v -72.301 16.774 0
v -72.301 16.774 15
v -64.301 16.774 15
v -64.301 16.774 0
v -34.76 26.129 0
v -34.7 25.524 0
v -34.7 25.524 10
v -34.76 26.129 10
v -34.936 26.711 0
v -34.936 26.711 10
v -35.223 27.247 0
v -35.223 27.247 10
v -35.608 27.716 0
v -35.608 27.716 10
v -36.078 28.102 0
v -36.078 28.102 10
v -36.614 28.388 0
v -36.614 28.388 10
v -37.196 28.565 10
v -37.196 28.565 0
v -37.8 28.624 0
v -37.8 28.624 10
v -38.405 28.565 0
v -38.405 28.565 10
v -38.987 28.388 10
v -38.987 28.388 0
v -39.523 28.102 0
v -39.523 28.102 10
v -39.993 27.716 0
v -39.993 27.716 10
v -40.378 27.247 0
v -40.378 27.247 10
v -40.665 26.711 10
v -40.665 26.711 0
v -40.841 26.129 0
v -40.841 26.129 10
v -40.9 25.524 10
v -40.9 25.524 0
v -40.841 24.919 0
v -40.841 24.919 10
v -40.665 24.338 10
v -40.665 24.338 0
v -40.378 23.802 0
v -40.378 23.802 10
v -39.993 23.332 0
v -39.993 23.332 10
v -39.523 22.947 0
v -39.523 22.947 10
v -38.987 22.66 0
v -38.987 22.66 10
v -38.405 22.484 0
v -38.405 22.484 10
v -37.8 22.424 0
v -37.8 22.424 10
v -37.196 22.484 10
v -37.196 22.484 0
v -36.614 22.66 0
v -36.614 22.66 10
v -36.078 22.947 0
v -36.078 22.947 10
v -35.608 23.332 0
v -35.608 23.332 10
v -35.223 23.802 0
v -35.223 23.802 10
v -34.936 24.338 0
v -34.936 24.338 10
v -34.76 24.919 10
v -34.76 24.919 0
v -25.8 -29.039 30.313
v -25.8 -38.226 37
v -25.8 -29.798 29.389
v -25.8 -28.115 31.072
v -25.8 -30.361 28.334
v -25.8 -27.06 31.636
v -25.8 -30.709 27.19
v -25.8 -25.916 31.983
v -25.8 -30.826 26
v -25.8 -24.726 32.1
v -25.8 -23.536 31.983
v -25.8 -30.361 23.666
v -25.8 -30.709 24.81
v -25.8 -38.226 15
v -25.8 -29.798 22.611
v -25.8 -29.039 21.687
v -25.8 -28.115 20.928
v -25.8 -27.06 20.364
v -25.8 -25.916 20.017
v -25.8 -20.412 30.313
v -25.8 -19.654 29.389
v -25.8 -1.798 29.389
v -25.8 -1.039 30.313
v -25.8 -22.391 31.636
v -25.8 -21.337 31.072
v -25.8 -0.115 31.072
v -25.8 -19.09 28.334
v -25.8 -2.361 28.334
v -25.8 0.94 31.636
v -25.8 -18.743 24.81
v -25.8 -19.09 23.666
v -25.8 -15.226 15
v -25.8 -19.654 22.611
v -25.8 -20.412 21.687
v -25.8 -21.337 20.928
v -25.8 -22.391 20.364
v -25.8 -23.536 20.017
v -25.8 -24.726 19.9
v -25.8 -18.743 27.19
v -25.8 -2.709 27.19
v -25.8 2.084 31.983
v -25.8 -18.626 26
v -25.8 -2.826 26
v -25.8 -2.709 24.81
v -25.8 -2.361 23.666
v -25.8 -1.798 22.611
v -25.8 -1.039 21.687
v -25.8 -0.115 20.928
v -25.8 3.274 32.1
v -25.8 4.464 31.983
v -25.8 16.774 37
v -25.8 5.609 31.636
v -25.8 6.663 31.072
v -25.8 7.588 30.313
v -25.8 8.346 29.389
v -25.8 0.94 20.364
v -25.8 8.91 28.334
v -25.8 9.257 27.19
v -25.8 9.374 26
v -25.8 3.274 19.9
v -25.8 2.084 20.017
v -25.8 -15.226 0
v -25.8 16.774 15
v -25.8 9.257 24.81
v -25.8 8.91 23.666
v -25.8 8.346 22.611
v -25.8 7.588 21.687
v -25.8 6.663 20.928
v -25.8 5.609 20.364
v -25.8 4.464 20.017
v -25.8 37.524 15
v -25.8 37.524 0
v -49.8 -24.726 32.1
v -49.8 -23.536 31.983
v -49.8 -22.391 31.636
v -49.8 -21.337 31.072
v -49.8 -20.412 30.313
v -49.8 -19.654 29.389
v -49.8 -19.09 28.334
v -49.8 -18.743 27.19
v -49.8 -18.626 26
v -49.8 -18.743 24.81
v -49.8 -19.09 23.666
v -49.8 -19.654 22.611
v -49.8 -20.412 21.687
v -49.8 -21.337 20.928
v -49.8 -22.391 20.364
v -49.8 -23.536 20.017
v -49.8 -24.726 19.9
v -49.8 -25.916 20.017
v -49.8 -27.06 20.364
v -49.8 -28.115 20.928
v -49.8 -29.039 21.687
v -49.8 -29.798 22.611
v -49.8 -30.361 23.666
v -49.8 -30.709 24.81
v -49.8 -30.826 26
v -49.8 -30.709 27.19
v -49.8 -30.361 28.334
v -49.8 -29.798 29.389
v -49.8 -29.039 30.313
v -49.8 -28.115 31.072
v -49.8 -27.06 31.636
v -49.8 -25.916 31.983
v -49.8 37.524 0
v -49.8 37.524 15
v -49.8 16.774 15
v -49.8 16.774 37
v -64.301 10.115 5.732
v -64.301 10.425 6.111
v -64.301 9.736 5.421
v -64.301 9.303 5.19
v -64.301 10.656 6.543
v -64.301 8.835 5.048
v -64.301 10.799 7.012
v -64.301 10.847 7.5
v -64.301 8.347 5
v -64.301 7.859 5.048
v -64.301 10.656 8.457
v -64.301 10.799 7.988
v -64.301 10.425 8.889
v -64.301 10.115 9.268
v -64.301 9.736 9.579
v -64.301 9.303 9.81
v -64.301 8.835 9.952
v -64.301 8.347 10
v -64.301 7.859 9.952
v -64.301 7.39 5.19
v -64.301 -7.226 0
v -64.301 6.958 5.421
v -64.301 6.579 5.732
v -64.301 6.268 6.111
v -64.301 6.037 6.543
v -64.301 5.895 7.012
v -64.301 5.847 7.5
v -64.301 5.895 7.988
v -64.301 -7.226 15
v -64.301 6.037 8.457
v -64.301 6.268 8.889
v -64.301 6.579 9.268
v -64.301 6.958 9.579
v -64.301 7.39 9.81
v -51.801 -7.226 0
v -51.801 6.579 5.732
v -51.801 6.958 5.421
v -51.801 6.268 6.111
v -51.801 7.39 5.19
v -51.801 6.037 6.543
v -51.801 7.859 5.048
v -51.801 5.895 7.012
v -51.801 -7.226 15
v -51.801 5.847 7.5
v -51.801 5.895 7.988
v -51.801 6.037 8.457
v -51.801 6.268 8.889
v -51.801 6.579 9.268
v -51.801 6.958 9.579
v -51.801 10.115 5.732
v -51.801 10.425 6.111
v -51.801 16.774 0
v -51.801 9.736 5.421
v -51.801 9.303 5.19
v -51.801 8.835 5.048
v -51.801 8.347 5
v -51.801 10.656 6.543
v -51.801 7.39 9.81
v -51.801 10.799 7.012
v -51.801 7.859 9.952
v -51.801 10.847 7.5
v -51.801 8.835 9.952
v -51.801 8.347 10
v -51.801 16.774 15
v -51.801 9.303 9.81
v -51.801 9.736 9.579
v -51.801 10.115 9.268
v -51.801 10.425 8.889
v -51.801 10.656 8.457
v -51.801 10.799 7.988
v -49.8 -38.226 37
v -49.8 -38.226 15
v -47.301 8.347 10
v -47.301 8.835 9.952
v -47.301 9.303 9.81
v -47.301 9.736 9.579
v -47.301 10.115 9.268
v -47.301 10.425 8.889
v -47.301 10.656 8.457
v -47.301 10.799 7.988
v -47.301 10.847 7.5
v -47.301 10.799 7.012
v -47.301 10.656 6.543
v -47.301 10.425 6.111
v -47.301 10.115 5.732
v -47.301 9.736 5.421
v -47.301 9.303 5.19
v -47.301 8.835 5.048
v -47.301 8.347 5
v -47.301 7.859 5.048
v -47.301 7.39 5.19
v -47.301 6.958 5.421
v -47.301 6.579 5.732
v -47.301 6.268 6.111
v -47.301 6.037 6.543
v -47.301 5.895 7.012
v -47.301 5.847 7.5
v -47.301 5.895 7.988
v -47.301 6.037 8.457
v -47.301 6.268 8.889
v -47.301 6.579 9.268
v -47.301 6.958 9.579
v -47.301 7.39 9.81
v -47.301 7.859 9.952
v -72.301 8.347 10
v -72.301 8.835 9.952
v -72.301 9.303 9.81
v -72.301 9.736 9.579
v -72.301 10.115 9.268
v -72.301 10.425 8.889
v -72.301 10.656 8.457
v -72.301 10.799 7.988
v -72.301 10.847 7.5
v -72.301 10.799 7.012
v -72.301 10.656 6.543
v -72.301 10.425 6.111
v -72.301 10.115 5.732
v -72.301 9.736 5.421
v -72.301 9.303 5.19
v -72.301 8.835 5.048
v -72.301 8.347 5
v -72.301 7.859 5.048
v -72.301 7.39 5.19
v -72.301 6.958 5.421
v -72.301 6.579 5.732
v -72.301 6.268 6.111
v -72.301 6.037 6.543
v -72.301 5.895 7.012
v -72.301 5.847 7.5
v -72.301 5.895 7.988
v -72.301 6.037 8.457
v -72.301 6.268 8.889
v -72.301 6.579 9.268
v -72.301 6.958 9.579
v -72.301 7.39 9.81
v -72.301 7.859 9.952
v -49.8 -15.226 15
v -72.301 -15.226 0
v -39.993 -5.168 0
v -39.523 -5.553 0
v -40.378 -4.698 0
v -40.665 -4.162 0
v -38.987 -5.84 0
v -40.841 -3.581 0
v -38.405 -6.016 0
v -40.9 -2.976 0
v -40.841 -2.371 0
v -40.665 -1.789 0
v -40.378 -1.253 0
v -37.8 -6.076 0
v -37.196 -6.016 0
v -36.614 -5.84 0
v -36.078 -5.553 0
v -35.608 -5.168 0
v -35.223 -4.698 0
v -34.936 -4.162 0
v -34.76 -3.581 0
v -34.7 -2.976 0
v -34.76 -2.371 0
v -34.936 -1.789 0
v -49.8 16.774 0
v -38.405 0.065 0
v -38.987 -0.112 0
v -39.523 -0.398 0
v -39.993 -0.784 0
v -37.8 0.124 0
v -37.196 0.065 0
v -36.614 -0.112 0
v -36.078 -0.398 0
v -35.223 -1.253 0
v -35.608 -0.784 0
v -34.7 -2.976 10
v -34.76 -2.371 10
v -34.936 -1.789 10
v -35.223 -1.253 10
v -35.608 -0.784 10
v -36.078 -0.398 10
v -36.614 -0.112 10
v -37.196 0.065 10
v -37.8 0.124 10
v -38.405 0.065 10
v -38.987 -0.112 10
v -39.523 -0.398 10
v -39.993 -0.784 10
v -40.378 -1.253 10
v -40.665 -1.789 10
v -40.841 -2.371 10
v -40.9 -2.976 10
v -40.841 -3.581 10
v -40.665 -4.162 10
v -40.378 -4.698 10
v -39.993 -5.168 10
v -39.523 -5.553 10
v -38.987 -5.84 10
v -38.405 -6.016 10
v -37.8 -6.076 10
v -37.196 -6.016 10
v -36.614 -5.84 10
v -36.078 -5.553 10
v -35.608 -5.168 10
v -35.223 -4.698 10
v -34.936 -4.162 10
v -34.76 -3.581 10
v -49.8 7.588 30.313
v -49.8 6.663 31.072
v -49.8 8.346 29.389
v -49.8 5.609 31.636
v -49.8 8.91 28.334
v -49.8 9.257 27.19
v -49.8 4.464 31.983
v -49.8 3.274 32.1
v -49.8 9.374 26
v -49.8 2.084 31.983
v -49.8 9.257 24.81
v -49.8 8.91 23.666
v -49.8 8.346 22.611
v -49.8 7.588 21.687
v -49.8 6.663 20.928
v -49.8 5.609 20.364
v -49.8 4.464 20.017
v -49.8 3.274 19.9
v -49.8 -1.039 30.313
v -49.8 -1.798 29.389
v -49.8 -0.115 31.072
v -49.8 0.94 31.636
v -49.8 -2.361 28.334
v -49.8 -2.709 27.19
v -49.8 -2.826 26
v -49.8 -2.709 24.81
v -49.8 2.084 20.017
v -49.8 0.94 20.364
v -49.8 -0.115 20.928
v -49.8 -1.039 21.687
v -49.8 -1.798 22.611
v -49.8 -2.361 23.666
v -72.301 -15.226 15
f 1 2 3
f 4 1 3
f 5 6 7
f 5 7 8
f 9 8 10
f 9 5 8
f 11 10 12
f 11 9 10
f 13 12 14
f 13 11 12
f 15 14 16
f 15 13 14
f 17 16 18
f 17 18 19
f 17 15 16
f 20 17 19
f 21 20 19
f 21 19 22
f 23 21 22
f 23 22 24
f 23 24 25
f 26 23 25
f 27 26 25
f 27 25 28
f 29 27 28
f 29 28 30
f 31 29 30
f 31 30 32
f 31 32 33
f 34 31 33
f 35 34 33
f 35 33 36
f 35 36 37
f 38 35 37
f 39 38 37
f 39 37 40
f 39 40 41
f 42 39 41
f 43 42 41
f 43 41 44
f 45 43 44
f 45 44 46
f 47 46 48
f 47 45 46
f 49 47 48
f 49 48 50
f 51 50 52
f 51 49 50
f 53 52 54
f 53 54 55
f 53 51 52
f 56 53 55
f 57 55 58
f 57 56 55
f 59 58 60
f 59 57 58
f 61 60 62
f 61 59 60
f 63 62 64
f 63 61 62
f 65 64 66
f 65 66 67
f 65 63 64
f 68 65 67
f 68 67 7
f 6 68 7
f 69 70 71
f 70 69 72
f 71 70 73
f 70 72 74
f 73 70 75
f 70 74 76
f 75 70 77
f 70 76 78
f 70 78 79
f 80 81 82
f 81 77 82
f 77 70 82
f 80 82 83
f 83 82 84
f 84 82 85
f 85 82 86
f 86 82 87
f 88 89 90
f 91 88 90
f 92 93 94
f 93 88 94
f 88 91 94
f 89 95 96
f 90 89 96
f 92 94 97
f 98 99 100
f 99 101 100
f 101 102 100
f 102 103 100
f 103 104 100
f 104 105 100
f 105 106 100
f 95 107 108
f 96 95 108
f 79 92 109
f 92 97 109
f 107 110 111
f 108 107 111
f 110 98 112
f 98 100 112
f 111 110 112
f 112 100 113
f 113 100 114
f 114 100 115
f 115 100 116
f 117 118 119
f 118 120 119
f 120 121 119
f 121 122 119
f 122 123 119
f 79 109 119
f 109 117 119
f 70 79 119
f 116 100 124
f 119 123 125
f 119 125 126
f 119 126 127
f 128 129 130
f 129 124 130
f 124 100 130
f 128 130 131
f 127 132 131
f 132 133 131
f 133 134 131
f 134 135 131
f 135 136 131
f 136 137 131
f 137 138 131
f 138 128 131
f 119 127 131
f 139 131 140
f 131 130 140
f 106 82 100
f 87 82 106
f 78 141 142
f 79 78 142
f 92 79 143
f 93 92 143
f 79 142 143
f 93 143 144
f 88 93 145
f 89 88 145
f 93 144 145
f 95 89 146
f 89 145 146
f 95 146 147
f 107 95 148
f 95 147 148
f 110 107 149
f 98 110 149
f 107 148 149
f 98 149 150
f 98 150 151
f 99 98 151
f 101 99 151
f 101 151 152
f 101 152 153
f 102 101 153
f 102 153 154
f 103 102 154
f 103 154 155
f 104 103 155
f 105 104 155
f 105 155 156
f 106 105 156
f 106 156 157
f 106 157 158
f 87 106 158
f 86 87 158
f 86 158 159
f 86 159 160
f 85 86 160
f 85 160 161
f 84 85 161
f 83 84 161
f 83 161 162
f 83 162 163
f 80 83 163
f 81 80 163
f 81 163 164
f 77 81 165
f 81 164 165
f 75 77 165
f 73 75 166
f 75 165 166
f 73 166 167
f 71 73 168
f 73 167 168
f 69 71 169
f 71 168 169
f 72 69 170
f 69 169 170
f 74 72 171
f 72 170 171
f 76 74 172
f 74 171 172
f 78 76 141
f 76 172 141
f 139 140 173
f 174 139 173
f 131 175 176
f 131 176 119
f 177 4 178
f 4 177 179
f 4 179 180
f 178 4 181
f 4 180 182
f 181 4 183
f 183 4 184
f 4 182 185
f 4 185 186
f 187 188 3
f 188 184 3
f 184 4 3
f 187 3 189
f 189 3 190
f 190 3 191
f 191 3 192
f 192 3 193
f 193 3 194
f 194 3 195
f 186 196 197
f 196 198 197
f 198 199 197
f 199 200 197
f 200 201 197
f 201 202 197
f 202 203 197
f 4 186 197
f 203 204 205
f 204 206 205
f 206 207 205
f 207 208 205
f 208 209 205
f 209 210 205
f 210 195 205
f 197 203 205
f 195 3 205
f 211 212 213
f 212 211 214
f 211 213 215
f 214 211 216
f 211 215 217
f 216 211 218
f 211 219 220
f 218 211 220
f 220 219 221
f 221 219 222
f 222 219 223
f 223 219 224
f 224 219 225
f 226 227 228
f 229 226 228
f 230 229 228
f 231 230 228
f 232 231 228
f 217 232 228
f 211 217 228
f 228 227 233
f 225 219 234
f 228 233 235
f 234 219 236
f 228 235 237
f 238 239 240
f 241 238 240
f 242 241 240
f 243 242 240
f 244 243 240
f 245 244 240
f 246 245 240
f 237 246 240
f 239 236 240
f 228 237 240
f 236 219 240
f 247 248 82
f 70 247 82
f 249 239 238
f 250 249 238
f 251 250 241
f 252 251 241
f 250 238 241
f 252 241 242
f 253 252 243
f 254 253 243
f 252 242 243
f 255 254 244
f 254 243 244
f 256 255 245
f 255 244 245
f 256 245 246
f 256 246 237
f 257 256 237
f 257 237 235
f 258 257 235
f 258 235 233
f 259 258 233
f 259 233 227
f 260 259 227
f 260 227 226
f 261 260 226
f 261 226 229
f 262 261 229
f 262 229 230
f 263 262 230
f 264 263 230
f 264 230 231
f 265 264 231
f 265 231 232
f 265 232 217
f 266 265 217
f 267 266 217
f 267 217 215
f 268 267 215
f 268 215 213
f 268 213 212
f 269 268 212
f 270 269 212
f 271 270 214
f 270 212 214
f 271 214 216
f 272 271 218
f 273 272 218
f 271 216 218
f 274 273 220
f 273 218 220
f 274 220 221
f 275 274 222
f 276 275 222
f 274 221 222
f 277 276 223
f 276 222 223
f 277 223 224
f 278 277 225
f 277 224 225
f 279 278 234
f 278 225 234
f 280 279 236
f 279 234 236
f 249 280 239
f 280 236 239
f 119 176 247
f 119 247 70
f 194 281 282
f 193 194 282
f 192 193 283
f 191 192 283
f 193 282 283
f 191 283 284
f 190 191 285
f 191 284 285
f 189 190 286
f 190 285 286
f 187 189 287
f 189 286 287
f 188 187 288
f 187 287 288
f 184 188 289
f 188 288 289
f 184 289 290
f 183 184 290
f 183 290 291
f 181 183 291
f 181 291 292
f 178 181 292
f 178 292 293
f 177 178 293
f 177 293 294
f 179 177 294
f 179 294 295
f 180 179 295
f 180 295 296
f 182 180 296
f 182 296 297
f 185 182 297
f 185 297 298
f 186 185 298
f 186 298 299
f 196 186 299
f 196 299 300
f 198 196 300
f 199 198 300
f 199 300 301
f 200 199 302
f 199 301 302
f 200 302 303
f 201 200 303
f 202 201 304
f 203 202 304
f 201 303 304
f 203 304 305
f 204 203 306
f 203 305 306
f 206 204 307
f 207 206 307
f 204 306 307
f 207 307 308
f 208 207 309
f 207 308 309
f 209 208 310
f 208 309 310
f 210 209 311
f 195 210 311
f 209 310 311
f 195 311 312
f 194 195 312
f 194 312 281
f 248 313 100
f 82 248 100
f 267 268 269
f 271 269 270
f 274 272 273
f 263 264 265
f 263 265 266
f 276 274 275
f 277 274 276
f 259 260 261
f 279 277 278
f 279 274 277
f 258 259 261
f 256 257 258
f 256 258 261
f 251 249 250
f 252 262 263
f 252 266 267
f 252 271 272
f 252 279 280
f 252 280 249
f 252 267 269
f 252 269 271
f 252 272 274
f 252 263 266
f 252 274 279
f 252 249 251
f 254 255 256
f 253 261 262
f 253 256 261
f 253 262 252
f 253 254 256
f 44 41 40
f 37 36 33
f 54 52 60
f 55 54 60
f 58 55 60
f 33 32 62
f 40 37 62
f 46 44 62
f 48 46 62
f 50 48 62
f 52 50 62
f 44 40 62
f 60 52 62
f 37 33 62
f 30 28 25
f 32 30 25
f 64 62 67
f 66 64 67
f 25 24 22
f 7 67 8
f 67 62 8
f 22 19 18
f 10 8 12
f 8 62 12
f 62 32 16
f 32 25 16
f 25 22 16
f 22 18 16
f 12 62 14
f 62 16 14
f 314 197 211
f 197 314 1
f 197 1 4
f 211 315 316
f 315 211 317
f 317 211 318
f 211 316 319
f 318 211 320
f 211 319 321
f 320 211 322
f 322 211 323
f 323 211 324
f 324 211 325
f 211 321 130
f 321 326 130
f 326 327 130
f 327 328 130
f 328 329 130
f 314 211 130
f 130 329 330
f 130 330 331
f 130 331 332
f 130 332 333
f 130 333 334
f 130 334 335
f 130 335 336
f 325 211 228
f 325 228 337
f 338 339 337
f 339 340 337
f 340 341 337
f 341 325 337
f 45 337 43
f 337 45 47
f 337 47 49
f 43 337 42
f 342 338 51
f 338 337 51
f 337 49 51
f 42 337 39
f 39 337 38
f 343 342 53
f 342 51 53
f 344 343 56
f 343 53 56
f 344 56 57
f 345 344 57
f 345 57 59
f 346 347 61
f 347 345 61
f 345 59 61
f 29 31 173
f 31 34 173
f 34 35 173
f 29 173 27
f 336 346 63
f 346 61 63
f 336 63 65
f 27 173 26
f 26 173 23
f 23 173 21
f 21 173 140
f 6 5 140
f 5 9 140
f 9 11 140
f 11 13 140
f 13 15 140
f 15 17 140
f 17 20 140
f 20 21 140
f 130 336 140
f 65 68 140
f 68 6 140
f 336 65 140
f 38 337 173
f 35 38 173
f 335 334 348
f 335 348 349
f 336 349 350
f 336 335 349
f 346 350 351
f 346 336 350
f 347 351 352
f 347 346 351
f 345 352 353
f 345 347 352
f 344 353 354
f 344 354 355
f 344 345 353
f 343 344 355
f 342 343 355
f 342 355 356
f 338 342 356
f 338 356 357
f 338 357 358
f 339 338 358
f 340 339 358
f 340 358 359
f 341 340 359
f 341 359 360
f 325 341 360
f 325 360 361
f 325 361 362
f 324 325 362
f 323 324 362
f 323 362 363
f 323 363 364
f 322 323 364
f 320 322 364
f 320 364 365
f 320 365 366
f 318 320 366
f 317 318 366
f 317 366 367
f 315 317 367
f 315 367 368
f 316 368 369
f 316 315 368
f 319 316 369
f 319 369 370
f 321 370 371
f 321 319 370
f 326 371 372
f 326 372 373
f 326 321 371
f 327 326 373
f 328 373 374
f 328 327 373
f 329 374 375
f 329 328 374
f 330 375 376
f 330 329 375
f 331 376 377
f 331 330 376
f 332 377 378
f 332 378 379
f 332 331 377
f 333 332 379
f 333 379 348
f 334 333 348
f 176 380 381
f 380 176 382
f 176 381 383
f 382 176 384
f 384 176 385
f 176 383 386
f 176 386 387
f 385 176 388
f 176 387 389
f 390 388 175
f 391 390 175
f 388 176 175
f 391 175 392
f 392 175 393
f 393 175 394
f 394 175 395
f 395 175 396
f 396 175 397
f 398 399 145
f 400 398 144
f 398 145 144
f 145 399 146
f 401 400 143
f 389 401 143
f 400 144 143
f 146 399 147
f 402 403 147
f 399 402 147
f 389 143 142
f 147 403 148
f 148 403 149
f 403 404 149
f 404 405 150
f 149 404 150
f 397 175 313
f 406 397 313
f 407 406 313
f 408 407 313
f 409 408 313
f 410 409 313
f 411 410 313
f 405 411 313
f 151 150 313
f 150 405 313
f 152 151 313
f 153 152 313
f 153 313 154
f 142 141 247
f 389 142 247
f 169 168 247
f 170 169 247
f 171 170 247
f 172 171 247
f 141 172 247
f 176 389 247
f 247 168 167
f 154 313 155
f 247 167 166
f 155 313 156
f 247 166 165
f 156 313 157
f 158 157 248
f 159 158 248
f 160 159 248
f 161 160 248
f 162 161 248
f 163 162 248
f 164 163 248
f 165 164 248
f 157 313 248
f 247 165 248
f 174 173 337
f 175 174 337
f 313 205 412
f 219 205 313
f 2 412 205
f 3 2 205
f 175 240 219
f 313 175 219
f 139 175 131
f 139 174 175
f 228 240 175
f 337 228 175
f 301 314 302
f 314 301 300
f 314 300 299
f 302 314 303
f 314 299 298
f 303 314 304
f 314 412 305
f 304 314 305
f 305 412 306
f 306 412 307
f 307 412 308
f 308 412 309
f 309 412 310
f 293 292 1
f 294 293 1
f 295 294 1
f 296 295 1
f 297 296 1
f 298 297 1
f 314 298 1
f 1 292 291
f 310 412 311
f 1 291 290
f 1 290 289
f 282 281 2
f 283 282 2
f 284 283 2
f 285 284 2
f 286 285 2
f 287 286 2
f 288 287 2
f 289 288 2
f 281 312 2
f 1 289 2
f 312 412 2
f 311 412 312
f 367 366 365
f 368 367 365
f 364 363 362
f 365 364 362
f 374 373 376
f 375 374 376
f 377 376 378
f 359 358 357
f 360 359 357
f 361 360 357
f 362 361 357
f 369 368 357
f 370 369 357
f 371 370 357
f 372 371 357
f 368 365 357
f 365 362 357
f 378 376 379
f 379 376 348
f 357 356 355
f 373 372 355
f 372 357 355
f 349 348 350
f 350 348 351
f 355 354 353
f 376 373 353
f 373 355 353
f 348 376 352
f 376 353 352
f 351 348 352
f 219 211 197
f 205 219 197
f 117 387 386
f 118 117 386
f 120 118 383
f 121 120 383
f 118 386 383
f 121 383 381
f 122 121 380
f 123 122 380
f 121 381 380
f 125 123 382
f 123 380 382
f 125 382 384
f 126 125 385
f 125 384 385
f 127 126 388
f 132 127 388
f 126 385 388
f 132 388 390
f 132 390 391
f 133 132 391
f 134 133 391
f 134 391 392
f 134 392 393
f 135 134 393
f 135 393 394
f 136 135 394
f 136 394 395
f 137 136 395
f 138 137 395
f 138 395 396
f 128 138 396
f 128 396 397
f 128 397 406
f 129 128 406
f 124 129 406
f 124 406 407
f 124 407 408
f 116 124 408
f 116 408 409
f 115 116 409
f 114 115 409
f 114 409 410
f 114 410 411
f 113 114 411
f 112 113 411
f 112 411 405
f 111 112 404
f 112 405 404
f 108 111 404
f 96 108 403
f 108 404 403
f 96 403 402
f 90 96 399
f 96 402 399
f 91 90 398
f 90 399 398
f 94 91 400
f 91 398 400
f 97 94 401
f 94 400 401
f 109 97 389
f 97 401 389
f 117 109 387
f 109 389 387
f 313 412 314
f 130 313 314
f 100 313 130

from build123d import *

# Parameters (mm, degrees)
SKETCH1_R           = 3.1
SKETCH1_R_2         = 2.5
BOSS_EXTRUDE1_DEPTH = 15
SKETCH6_R           = 3.1
BOSS_EXTRUDE3_DEPTH = 5
BOSS_EXTRUDE4_DEPTH = 15
SKETCH8_R           = 2.5
CUT_EXTRUDE3_DEPTH  = 25
CUT_EXTRUDE4_DEPTH  = 16
SKETCH11_W          = 24
SKETCH11_H          = 0.25
BOSS_EXTRUDE5_DEPTH = 15
SKETCH12_W          = 24
SKETCH12_H          = 32
SKETCH12_H_2        = 23
BOSS_EXTRUDE6_DEPTH = 22
SKETCH13_R          = 6.1
CUT_EXTRUDE5_DEPTH  = 25


with BuildPart() as part:
    # Sketch1 → Boss-Extrude1 (new body)
    with BuildSketch(Plane.XY):
        with BuildLine():
            Line((-25.80048806, 37.524276553), (-49.80048806, 37.524276553))
            Line((-49.80048806, 37.524276553), (-49.80048806, -14.975723447))
            Line((-49.80048806, -14.975723447), (-41.80048806, -45.286414829))
            ThreePointArc((-41.80048806, -45.286414829), (-37.80048806, -49.286414829), (-33.80048806, -45.286414829))
            Line((-33.80048806, -45.286414829), (-25.80048806, -14.975723447))
            Line((-25.80048806, -14.975723447), (-25.80048806, 37.524276553))
        make_face()
        with Locations((-37.80048806, 25.524276553)):
            Circle(SKETCH1_R, mode=Mode.SUBTRACT)
        with Locations((-37.80048806, -2.975723447)):
            Circle(SKETCH1_R, mode=Mode.SUBTRACT)
        with Locations((-37.80048806, -45.286414829)):
            Circle(SKETCH1_R_2, mode=Mode.SUBTRACT)
    extrude(amount=BOSS_EXTRUDE1_DEPTH)

    # Sketch6 → Boss-Extrude3 (add)
    with BuildSketch(Plane.XY.offset(15)):
        with Locations((-37.80048806, -2.975723447)):
            Circle(SKETCH6_R)
        with Locations((-37.80048806, 25.524276553)):
            Circle(SKETCH6_R)
    extrude(amount=-BOSS_EXTRUDE3_DEPTH)

    # Sketch7 → Boss-Extrude4 (add)
    with BuildSketch(Plane.XY.offset(15)):
        Polygon((-51.800511672, 16.774276553), (-49.80048806, 16.774276553), (-49.80048806, -15.225723447), (-72.300511672, -15.225723447), (-72.300511672, 16.774276553), (-64.300511672, 16.774276553), (-64.300511672, -7.225723447), (-58.050499866, -7.225723447), (-51.800511672, -7.225723447), align=None)
    extrude(amount=-BOSS_EXTRUDE4_DEPTH)

    # Sketch8 → Cut-Extrude3 (cut)
    with BuildSketch(Plane.ZY.offset(72.300511672)):
        with Locations((7.5, 8.346782821)):
            Circle(SKETCH8_R)
    extrude(amount=-CUT_EXTRUDE3_DEPTH, mode=Mode.SUBTRACT)

    # Sketch10 → Cut-Extrude4 (cut, through all)
    with BuildSketch(Plane.XY.offset(15)):
        Polygon((-49.80048806, -15.225723447), (-49.80048806, -14.975723447), (-25.80048806, -14.975723447), (-25.80048806, -50.615055613), (-49.80048806, -50.615055613), align=None)
    extrude(amount=-CUT_EXTRUDE4_DEPTH, mode=Mode.SUBTRACT)

    # Sketch11 → Boss-Extrude5 (add)
    with BuildSketch(Plane.XY.offset(15)):
        with Locations((-37.80048806, -15.100723447)):
            Rectangle(SKETCH11_W, SKETCH11_H)
    extrude(amount=-BOSS_EXTRUDE5_DEPTH)

    # Sketch12 → Boss-Extrude6 (add)
    with BuildSketch(Plane.XY.offset(15)):
        with Locations((-37.80048806, 0.774276553)):
            Rectangle(SKETCH12_W, SKETCH12_H)
        with Locations((-37.80048806, -26.725723447)):
            Rectangle(SKETCH12_W, SKETCH12_H_2)
    extrude(amount=BOSS_EXTRUDE6_DEPTH)

    # Sketch13 → Cut-Extrude5 (cut, through all)
    with BuildSketch(Plane.ZY.offset(49.80048806)):
        with Locations((26, 3.274276553)):
            Circle(SKETCH13_R)
        with Locations((26, -24.725723447)):
            Circle(SKETCH13_R)
    extrude(amount=-CUT_EXTRUDE5_DEPTH, mode=Mode.SUBTRACT)


solid = part.part
